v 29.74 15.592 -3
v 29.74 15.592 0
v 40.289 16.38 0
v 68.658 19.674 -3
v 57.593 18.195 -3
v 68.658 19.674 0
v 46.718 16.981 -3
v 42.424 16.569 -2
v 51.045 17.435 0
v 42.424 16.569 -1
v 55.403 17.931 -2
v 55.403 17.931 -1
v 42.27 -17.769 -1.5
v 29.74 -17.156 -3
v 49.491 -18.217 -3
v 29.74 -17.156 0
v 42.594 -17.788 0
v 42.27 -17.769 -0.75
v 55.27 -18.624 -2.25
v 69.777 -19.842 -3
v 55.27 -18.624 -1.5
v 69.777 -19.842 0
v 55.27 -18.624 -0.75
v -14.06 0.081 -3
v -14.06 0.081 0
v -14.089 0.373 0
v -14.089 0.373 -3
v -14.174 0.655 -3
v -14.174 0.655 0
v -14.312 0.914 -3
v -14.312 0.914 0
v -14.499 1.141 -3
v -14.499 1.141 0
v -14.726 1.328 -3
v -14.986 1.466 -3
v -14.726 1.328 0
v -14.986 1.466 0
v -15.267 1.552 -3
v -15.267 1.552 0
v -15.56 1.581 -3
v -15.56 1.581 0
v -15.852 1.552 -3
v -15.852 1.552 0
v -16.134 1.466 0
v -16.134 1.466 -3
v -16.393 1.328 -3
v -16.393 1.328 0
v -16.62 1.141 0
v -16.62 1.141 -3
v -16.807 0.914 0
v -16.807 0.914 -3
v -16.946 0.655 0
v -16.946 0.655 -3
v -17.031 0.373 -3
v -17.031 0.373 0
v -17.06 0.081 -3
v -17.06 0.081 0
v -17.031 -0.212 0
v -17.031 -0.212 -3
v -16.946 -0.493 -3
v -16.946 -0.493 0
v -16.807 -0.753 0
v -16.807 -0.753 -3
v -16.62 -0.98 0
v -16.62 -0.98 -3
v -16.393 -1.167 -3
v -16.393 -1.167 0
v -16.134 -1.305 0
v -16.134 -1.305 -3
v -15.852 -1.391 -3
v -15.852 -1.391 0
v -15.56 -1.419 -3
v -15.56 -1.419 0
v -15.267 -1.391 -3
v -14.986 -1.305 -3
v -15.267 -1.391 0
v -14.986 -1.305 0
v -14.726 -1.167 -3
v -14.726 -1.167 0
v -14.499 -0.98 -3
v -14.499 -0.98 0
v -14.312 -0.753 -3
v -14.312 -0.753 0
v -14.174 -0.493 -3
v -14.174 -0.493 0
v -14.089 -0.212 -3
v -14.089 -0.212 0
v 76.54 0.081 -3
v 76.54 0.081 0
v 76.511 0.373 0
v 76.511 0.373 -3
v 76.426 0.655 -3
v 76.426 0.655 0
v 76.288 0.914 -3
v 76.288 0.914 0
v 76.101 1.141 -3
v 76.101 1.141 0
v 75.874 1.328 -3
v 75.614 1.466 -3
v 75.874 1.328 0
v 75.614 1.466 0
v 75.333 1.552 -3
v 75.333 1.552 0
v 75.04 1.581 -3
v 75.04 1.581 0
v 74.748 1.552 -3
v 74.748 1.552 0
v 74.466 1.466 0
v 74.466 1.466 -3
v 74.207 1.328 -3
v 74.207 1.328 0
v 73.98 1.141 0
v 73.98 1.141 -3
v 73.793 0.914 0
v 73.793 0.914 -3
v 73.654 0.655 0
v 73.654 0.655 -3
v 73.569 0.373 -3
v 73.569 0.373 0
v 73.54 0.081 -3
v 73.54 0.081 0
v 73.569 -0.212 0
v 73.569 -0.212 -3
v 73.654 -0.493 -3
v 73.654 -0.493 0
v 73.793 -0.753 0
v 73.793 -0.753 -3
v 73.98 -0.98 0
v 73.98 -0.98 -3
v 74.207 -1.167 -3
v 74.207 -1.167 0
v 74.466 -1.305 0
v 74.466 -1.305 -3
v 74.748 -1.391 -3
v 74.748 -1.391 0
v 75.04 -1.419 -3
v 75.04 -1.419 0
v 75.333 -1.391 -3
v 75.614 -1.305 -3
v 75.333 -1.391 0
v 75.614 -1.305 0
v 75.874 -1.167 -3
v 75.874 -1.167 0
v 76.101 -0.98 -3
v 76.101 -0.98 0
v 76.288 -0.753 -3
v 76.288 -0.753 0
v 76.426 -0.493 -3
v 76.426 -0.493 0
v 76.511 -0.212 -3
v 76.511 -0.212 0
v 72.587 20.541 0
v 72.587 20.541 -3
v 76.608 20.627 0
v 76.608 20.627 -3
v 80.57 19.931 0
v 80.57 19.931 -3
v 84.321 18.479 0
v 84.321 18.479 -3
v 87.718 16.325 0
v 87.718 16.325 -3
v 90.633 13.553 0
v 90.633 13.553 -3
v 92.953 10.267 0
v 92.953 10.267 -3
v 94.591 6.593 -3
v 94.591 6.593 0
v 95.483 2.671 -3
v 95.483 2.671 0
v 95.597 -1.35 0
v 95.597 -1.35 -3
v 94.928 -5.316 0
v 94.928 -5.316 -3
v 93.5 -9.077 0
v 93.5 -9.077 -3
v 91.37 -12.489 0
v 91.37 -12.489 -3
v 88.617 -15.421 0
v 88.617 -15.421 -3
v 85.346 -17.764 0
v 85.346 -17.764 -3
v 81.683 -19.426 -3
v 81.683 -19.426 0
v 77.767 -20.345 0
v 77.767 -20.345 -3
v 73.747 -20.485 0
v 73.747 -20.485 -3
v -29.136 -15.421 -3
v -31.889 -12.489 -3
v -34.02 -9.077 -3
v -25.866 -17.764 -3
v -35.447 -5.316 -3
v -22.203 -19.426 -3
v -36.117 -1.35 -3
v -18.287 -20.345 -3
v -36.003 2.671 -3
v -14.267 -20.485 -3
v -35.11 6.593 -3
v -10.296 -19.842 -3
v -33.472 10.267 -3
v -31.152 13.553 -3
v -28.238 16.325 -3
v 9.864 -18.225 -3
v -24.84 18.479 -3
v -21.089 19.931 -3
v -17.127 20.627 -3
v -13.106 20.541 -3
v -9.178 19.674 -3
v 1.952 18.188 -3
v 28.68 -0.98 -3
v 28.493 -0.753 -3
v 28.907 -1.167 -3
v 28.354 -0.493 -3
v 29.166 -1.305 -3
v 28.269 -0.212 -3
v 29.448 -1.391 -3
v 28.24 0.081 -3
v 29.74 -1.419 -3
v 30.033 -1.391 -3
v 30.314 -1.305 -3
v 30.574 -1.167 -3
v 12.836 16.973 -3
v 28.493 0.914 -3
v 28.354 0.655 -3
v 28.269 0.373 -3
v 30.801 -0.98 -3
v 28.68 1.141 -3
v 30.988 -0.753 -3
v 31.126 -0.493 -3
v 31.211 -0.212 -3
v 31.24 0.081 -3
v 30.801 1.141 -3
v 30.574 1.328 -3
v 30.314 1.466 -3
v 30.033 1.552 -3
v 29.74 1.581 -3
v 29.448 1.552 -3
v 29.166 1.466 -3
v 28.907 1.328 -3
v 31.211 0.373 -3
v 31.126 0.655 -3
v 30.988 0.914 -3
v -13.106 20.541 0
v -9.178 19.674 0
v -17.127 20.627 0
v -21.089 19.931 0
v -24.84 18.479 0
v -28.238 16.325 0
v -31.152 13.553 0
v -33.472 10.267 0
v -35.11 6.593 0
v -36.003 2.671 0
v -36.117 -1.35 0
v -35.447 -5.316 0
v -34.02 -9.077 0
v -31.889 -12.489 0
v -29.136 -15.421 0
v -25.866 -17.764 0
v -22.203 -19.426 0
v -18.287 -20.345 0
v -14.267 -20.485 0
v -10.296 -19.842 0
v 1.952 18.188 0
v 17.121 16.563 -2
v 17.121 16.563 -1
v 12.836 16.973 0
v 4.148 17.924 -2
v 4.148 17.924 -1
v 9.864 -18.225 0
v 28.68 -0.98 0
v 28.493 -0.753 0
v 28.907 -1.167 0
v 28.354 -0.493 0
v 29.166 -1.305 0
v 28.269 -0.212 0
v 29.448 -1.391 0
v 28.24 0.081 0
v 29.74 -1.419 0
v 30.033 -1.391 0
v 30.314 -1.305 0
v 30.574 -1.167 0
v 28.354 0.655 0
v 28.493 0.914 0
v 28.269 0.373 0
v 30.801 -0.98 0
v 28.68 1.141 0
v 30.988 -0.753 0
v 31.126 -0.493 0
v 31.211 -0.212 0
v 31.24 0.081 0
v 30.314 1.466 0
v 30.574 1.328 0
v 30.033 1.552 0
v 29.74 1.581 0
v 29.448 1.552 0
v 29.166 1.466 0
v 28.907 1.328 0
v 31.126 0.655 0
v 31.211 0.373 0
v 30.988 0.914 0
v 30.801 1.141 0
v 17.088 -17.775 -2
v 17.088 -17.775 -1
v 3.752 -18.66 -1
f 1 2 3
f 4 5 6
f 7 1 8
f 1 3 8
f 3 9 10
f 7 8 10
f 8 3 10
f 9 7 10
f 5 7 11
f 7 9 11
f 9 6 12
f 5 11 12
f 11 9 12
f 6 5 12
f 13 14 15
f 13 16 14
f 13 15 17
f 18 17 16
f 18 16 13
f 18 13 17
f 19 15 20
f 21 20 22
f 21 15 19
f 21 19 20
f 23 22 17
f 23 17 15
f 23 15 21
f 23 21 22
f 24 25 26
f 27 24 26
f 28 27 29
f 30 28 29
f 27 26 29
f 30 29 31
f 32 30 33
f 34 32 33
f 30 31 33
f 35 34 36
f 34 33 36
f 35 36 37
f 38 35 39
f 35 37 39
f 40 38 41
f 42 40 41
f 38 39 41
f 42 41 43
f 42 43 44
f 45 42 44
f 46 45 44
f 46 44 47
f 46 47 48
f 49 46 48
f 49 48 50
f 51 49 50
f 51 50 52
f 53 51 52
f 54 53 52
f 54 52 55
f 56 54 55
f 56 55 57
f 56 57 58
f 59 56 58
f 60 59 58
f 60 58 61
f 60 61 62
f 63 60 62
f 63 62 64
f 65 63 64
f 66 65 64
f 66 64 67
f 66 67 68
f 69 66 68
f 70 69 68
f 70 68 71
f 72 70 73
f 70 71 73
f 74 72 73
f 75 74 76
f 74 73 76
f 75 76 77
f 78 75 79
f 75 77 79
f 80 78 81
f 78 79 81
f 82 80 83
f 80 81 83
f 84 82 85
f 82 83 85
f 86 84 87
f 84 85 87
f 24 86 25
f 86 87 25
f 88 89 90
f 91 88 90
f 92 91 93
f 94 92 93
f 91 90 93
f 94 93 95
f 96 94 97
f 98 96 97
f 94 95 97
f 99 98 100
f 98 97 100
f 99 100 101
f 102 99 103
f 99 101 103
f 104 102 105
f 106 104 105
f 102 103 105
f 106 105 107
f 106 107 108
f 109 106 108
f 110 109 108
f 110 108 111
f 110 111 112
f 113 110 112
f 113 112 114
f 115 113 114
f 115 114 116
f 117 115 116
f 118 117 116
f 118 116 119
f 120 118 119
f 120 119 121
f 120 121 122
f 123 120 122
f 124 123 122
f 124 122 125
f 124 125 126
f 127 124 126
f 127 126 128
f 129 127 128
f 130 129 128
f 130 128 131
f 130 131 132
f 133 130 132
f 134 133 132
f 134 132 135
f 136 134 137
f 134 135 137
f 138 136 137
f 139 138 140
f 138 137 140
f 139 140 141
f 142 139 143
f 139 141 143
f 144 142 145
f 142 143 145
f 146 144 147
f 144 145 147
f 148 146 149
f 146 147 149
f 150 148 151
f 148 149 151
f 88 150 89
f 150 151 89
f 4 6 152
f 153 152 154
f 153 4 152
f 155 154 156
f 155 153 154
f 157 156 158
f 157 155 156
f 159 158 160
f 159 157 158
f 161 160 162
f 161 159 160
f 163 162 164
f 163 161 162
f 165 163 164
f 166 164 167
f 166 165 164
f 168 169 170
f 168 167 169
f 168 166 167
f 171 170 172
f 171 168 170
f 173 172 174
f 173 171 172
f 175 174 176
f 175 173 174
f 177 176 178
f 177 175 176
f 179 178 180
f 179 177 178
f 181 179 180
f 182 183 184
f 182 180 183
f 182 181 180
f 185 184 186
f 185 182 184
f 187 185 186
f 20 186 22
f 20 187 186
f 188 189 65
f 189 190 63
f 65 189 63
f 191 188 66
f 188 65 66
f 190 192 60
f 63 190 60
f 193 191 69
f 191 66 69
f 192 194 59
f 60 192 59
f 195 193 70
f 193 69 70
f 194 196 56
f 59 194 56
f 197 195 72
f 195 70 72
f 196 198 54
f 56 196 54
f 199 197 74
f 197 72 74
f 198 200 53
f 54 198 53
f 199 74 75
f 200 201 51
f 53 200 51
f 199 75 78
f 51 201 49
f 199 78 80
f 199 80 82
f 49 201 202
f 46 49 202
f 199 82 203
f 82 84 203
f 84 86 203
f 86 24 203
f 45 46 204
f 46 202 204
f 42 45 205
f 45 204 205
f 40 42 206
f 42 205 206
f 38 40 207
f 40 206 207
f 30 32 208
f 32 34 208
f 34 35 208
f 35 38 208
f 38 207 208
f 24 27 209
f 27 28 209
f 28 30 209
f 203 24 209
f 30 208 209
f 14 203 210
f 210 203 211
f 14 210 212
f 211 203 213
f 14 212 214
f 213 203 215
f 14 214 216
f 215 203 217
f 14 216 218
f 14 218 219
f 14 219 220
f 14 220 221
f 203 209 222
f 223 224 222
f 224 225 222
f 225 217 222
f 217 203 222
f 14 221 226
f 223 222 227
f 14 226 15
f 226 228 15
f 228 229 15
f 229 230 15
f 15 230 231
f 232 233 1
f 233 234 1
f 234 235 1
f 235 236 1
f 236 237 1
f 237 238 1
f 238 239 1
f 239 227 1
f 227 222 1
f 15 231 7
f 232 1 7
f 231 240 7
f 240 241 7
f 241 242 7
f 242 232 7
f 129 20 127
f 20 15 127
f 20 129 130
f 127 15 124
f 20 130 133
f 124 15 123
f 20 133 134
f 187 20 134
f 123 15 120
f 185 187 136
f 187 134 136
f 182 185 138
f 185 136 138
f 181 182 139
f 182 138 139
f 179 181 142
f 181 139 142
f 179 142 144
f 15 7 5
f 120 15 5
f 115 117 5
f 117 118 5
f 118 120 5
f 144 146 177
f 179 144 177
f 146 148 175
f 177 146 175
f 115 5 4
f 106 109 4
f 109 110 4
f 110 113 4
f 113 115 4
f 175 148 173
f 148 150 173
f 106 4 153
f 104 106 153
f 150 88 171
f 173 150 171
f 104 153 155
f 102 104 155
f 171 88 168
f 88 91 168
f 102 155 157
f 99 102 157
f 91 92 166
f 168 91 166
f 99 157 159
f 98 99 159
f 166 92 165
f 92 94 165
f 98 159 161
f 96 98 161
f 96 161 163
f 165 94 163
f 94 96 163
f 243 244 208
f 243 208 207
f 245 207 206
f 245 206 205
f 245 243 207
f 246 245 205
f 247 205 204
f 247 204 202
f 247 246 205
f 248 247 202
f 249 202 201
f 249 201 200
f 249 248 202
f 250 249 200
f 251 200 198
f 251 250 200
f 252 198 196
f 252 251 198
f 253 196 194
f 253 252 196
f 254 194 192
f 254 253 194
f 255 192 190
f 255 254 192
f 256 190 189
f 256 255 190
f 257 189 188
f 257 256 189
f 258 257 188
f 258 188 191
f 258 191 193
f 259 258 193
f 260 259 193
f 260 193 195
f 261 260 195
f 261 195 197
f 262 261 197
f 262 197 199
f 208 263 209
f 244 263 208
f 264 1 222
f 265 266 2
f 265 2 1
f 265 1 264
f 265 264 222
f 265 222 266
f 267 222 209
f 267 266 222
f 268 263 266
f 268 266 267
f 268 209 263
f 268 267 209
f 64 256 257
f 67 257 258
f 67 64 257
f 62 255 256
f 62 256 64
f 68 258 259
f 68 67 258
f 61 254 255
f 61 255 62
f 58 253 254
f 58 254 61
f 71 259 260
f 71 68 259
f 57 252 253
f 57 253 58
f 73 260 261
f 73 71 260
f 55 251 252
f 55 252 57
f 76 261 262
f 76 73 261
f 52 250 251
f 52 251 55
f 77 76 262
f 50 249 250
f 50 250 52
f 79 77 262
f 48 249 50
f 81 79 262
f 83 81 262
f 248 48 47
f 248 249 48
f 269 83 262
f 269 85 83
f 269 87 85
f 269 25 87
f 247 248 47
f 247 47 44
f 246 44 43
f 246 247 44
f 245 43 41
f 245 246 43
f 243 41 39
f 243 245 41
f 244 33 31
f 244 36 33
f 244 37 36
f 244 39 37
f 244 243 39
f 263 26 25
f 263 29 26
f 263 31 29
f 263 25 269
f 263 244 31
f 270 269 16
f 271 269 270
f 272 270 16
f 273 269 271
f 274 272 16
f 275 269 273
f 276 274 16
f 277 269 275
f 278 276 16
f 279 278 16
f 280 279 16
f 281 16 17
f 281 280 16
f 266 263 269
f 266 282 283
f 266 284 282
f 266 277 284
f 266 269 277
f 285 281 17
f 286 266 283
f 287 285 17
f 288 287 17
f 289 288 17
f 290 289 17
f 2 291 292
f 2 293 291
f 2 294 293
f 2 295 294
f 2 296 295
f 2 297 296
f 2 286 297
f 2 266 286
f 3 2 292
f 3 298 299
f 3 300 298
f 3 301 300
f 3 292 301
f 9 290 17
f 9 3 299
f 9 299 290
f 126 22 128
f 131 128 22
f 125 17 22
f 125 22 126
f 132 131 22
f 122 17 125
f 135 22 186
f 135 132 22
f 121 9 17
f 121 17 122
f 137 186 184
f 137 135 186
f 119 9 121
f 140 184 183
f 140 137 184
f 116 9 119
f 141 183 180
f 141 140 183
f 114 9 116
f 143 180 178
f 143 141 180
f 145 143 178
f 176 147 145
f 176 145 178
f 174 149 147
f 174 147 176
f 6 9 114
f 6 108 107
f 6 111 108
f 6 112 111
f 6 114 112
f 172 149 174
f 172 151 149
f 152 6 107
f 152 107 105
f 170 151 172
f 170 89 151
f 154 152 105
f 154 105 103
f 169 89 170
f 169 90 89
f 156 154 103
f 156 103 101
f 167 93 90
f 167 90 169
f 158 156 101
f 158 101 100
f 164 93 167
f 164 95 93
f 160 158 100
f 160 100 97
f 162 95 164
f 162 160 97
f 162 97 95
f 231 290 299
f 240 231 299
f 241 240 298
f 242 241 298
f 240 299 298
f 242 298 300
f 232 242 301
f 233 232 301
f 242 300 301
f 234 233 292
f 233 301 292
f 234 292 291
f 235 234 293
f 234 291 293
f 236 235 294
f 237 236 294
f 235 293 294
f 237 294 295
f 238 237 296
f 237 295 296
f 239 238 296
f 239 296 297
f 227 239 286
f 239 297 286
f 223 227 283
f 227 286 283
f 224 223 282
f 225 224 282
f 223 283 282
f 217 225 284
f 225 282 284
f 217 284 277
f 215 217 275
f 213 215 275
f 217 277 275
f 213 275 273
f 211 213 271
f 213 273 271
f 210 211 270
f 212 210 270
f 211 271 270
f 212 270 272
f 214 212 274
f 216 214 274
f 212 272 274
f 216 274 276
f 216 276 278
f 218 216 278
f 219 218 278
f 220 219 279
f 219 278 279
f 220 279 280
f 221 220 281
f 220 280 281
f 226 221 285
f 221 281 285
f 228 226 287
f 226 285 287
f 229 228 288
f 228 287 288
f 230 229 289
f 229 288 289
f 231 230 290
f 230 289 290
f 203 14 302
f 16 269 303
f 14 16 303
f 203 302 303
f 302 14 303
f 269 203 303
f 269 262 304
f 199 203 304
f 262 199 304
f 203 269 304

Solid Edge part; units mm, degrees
sketch "Sketch1" plane through (0, 0, 0) normal (0, 0, 1) x (1, 0, 0)
  spline S0 degree 3 poles (-69.5242, 19.4932) (-23.3267, 12.9257) (22.6888, 12.9752) (68.6585, 19.674) knots 0 0 0 0 1 1 1 1
  spline S1 degree 3 poles (-69.54, -19.6556) (-23.1773, -15.4302) (23.2615, -15.4924) (69.7765, -19.8423) knots 0 0 0 0 1 1 1 1
  arc A0 (-69.54, -19.6556) -> (-69.5242, 19.4932) centre (-75.1666, -0.0789) cw
  arc A1 (68.6585, 19.674) -> (69.7765, -19.8423) centre (75.0403, 0.0806) cw
extrude "Protrusion1" add sketch "Sketch1" along normal blind 3
sketch "Sketch2" plane through (0.0555, 0.0806, 3) normal (0, 0, 1) x (1, 0, 0)
  circle A0 centre (83.5848, 0) radius 1
  circle A1 centre (55.6848, 0) radius 1
  line L0 (-58.5721, -6.5095) -> (-58.5721, 6.1905)
  line L1 (-58.5721, 6.1905) -> (-81.1721, 6.1905)
  line L2 (-81.1721, 6.1905) -> (-81.1721, -6.5095)
  line L3 (-81.1721, -6.5095) -> (-58.5721, -6.5095)
  circle A2 centre (-83.8221, -0.1595) radius 1
  circle A3 centre (-55.9221, -0.1595) radius 1
  line L4 (58.3348, 6.35) -> (58.3348, -6.35)
  line L5 (58.3348, -6.35) -> (80.9348, -6.35)
  line L6 (80.9348, -6.35) -> (80.9348, 6.35)
  line L7 (80.9348, 6.35) -> (58.3348, 6.35)
  dimension "D1" = 22.6
  dimension "D2" = 22.6
  dimension "D3" = 12.7
extrude "ExtrudedCutout_1" cut sketch "Sketch2" against normal blind 484.752
sketch "Sketch3" plane through (0.0555, 0.0806, 3) normal (0, 0, 1) x (1, 0, 0)
  line L0 (29.6848, 27.4896) -> (-99.1539, 27.4896)
  line L1 (-99.1539, 27.4896) -> (-99.1539, -25.8213)
  line L2 (-99.1539, -25.8213) -> (29.6848, -25.8213)
  line L3 (29.6848, -25.8213) -> (29.6848, 27.4896)
extrude "ExtrudedCutout_2" cut sketch "Sketch3" against normal blind 169.5138
sketch "Sketch4" plane through (0, 0, 0) normal (0, 0, 1) x (1, 0, 0)
  line L0 (29.7403, -17.1563) -> (29.7403, 15.5915)
  spline S0 degree 3 poles (29.7403, 15.5915) (42.2697, 16.3768) (55.2702, 17.7412) (68.6585, 19.674) knots 0 0 0 0 1 1 1 1
  spline S1 degree 3 poles (29.7403, -17.1563) (34.3353, -17.3622) (40.0841, -17.6253) (48.6781, -18.1532) (57.9287, -18.805) (64.4454, -19.3301) (69.7765, -19.8423) knots 0 0 0 0 0.312805 0.467988 0.637686 1 1 1 1
  arc A0 (68.6585, 19.674) -> (69.7765, -19.8423) centre (75.0403, 0.0806) cw
  line L1 (58.3903, -6.2694) -> (58.3903, 6.4306)
  line L2 (58.3903, 6.4306) -> (80.9903, 6.4306)
  line L3 (80.9903, 6.4306) -> (80.9903, -6.2694)
  line L4 (80.9903, -6.2694) -> (58.3903, -6.2694)
  circle A1 centre (55.7403, 0.0806) radius 1
  circle A2 centre (83.6403, 0.0806) radius 1
  line L5 (29.7403, -17.1563) -> (29.7403, 15.5915)
  spline S2 degree 3 poles (29.7403, 15.5915) (17.2109, 16.3768) (4.2104, 17.7412) (-9.1779, 19.674) knots 0 0 0 0 1 1 1 1
  arc A3 (-9.1779, 19.674) -> (-10.2959, -19.8423) centre (-15.5597, 0.0806) ccw
  spline S3 degree 3 poles (29.7403, -17.1563) (25.1453, -17.3622) (19.3965, -17.6253) (10.8024, -18.1532) (1.5519, -18.805) (-4.9648, -19.3301) (-10.2959, -19.8423) knots 0 0 0 0 0.312805 0.467988 0.637686 1 1 1 1
  line L6 (1.0903, -6.2694) -> (1.0903, 6.4306)
  line L7 (1.0903, 6.4306) -> (-21.5097, 6.4306)
  line L8 (-21.5097, 6.4306) -> (-21.5097, -6.2694)
  line L9 (-21.5097, -6.2694) -> (1.0903, -6.2694)
  circle A4 centre (3.7403, 0.0806) radius 1
  circle A5 centre (-24.1597, 0.0806) radius 1
extrude "ExtrudedProtrusion_2" add sketch "Sketch4" against normal blind 3
sketch "Sketch5" plane through (-3.213, 0.0806, 0) normal (0, 0, 1) x (0, 1, 0)
  line L0 (25.6992, -32.9533) -> (-24.0131, -32.9533)
  line L1 (-24.0131, -32.9533) -> (-24.0131, 35.3247)
  line L2 (-24.0131, 35.3247) -> (25.6992, 35.3247)
  line L3 (25.6992, 35.3247) -> (25.6992, -32.9533)
extrude "ExtrudedCutout_3" cut sketch "Sketch5" against normal blind 310.7547
sketch "Sketch6" plane through (69.6903, 6.4306, 0) normal (0, -1, 0) x (1, 0, 0)
  line L0 (-39.95, 3) -> (25.9565, 3)
  line L1 (25.9565, 3) -> (25.9565, 0)
  line L2 (25.9565, 0) -> (-39.95, 0)
  line L3 (-39.95, 0) -> (-39.95, 3)
extrude "ExtrudedCutout_4" cut sketch "Sketch6" against normal blind 369.6121
sketch "Sketch7" plane through (69.6903, -6.2694, 0) normal (0, 1, 0) x (1, 0, 0)
  line L0 (-39.95, -0.4111) -> (-39.95, -3)
  line L1 (-39.95, -3) -> (25.7218, -3)
  line L2 (25.7218, -3) -> (25.9565, 0)
  line L3 (25.9565, 0) -> (-39.95, -0.4111)
extrude "ExtrudedCutout_5" cut sketch "Sketch7" against normal blind 176.465
sketch "Sketch8" plane through (29.7403, -0.7635, 0) normal (-1, 0, 0) x (0, -1, 0)
  line L0 (20.933, 0) -> (-7.194, 0)
  line L1 (-7.194, 0) -> (-7.194, 4.1468)
  line L2 (-7.194, 4.1468) -> (20.933, 4.1468)
  line L3 (20.933, 4.1468) -> (20.933, 0)
extrude "ExtrudedCutout_6" cut sketch "Sketch8" against normal blind 228.3963
sketch "Sketch9" plane through (0, 0, 0) normal (0, 0, 1) x (1, 0, 0)
  line L0 (-21.5097, -6.2694) -> (-21.5097, 6.4306)
  line L1 (-21.5097, 6.4306) -> (1.0903, 6.4306)
  line L2 (1.0903, -6.2694) -> (1.0903, 6.4306)
  line L3 (1.0903, -6.2694) -> (-21.5097, -6.2694)
  circle A0 centre (3.7403, 0.0806) radius 1
  circle A1 centre (-24.1597, 0.0806) radius 1
  spline S0 degree 3 poles (29.7403, 15.5915) (17.2977, 16.3681) (4.325, 17.7289) (-9.1779, 19.674) knots 0 0 0 0 1 1 1 1
  arc A2 (-9.1779, 19.674) -> (-10.2959, -19.8423) centre (-15.5597, 0.0806) ccw
  spline S1 degree 3 poles (29.7403, -17.1563) (17.4202, -17.6536) (4.1171, -18.5003) (-10.2959, -19.8423) knots 0 0 0 0 1 1 1 1
  line L4 (29.7403, -17.1563) -> (29.7403, 15.5915)
extrude "ExtrudedProtrusion_3" add sketch "Sketch9" against normal blind 3
sketch "Sketch10" plane through (29.7403, 0.0806, 0) normal (0, 0, 1) x (1, 0, 0)
  line L0 (-24.0106, -8.9531) -> (-56.723, -8.9531)
  line L1 (-56.723, -8.9531) -> (-56.723, 8.934)
  line L2 (-56.723, 8.934) -> (-24.0106, 8.934)
  line L3 (-24.0106, 8.934) -> (-24.0106, -8.9531)
  line L4 (23.0437, -9.1142) -> (23.0437, 9.5786)
  line L5 (23.0437, 9.5786) -> (56.723, 9.5786)
  line L6 (56.723, 9.5786) -> (56.723, -9.1142)
  line L7 (56.723, -9.1142) -> (23.0437, -9.1142)
extrude "ExtrudedProtrusion_4" add sketch "Sketch10" against normal blind 3
sketch "Sketch11" plane through (29.7403, 0.0806, 0) normal (0, 0, 1) x (1, 0, 0)
  circle A0 centre (-45.3, 0) radius 1.5
  circle A1 centre (45.3, 0) radius 1.5
  circle A2 centre (0, 0) radius 1.5
extrude "Cutout1" cut sketch "Sketch11" against normal blind 593.6896
